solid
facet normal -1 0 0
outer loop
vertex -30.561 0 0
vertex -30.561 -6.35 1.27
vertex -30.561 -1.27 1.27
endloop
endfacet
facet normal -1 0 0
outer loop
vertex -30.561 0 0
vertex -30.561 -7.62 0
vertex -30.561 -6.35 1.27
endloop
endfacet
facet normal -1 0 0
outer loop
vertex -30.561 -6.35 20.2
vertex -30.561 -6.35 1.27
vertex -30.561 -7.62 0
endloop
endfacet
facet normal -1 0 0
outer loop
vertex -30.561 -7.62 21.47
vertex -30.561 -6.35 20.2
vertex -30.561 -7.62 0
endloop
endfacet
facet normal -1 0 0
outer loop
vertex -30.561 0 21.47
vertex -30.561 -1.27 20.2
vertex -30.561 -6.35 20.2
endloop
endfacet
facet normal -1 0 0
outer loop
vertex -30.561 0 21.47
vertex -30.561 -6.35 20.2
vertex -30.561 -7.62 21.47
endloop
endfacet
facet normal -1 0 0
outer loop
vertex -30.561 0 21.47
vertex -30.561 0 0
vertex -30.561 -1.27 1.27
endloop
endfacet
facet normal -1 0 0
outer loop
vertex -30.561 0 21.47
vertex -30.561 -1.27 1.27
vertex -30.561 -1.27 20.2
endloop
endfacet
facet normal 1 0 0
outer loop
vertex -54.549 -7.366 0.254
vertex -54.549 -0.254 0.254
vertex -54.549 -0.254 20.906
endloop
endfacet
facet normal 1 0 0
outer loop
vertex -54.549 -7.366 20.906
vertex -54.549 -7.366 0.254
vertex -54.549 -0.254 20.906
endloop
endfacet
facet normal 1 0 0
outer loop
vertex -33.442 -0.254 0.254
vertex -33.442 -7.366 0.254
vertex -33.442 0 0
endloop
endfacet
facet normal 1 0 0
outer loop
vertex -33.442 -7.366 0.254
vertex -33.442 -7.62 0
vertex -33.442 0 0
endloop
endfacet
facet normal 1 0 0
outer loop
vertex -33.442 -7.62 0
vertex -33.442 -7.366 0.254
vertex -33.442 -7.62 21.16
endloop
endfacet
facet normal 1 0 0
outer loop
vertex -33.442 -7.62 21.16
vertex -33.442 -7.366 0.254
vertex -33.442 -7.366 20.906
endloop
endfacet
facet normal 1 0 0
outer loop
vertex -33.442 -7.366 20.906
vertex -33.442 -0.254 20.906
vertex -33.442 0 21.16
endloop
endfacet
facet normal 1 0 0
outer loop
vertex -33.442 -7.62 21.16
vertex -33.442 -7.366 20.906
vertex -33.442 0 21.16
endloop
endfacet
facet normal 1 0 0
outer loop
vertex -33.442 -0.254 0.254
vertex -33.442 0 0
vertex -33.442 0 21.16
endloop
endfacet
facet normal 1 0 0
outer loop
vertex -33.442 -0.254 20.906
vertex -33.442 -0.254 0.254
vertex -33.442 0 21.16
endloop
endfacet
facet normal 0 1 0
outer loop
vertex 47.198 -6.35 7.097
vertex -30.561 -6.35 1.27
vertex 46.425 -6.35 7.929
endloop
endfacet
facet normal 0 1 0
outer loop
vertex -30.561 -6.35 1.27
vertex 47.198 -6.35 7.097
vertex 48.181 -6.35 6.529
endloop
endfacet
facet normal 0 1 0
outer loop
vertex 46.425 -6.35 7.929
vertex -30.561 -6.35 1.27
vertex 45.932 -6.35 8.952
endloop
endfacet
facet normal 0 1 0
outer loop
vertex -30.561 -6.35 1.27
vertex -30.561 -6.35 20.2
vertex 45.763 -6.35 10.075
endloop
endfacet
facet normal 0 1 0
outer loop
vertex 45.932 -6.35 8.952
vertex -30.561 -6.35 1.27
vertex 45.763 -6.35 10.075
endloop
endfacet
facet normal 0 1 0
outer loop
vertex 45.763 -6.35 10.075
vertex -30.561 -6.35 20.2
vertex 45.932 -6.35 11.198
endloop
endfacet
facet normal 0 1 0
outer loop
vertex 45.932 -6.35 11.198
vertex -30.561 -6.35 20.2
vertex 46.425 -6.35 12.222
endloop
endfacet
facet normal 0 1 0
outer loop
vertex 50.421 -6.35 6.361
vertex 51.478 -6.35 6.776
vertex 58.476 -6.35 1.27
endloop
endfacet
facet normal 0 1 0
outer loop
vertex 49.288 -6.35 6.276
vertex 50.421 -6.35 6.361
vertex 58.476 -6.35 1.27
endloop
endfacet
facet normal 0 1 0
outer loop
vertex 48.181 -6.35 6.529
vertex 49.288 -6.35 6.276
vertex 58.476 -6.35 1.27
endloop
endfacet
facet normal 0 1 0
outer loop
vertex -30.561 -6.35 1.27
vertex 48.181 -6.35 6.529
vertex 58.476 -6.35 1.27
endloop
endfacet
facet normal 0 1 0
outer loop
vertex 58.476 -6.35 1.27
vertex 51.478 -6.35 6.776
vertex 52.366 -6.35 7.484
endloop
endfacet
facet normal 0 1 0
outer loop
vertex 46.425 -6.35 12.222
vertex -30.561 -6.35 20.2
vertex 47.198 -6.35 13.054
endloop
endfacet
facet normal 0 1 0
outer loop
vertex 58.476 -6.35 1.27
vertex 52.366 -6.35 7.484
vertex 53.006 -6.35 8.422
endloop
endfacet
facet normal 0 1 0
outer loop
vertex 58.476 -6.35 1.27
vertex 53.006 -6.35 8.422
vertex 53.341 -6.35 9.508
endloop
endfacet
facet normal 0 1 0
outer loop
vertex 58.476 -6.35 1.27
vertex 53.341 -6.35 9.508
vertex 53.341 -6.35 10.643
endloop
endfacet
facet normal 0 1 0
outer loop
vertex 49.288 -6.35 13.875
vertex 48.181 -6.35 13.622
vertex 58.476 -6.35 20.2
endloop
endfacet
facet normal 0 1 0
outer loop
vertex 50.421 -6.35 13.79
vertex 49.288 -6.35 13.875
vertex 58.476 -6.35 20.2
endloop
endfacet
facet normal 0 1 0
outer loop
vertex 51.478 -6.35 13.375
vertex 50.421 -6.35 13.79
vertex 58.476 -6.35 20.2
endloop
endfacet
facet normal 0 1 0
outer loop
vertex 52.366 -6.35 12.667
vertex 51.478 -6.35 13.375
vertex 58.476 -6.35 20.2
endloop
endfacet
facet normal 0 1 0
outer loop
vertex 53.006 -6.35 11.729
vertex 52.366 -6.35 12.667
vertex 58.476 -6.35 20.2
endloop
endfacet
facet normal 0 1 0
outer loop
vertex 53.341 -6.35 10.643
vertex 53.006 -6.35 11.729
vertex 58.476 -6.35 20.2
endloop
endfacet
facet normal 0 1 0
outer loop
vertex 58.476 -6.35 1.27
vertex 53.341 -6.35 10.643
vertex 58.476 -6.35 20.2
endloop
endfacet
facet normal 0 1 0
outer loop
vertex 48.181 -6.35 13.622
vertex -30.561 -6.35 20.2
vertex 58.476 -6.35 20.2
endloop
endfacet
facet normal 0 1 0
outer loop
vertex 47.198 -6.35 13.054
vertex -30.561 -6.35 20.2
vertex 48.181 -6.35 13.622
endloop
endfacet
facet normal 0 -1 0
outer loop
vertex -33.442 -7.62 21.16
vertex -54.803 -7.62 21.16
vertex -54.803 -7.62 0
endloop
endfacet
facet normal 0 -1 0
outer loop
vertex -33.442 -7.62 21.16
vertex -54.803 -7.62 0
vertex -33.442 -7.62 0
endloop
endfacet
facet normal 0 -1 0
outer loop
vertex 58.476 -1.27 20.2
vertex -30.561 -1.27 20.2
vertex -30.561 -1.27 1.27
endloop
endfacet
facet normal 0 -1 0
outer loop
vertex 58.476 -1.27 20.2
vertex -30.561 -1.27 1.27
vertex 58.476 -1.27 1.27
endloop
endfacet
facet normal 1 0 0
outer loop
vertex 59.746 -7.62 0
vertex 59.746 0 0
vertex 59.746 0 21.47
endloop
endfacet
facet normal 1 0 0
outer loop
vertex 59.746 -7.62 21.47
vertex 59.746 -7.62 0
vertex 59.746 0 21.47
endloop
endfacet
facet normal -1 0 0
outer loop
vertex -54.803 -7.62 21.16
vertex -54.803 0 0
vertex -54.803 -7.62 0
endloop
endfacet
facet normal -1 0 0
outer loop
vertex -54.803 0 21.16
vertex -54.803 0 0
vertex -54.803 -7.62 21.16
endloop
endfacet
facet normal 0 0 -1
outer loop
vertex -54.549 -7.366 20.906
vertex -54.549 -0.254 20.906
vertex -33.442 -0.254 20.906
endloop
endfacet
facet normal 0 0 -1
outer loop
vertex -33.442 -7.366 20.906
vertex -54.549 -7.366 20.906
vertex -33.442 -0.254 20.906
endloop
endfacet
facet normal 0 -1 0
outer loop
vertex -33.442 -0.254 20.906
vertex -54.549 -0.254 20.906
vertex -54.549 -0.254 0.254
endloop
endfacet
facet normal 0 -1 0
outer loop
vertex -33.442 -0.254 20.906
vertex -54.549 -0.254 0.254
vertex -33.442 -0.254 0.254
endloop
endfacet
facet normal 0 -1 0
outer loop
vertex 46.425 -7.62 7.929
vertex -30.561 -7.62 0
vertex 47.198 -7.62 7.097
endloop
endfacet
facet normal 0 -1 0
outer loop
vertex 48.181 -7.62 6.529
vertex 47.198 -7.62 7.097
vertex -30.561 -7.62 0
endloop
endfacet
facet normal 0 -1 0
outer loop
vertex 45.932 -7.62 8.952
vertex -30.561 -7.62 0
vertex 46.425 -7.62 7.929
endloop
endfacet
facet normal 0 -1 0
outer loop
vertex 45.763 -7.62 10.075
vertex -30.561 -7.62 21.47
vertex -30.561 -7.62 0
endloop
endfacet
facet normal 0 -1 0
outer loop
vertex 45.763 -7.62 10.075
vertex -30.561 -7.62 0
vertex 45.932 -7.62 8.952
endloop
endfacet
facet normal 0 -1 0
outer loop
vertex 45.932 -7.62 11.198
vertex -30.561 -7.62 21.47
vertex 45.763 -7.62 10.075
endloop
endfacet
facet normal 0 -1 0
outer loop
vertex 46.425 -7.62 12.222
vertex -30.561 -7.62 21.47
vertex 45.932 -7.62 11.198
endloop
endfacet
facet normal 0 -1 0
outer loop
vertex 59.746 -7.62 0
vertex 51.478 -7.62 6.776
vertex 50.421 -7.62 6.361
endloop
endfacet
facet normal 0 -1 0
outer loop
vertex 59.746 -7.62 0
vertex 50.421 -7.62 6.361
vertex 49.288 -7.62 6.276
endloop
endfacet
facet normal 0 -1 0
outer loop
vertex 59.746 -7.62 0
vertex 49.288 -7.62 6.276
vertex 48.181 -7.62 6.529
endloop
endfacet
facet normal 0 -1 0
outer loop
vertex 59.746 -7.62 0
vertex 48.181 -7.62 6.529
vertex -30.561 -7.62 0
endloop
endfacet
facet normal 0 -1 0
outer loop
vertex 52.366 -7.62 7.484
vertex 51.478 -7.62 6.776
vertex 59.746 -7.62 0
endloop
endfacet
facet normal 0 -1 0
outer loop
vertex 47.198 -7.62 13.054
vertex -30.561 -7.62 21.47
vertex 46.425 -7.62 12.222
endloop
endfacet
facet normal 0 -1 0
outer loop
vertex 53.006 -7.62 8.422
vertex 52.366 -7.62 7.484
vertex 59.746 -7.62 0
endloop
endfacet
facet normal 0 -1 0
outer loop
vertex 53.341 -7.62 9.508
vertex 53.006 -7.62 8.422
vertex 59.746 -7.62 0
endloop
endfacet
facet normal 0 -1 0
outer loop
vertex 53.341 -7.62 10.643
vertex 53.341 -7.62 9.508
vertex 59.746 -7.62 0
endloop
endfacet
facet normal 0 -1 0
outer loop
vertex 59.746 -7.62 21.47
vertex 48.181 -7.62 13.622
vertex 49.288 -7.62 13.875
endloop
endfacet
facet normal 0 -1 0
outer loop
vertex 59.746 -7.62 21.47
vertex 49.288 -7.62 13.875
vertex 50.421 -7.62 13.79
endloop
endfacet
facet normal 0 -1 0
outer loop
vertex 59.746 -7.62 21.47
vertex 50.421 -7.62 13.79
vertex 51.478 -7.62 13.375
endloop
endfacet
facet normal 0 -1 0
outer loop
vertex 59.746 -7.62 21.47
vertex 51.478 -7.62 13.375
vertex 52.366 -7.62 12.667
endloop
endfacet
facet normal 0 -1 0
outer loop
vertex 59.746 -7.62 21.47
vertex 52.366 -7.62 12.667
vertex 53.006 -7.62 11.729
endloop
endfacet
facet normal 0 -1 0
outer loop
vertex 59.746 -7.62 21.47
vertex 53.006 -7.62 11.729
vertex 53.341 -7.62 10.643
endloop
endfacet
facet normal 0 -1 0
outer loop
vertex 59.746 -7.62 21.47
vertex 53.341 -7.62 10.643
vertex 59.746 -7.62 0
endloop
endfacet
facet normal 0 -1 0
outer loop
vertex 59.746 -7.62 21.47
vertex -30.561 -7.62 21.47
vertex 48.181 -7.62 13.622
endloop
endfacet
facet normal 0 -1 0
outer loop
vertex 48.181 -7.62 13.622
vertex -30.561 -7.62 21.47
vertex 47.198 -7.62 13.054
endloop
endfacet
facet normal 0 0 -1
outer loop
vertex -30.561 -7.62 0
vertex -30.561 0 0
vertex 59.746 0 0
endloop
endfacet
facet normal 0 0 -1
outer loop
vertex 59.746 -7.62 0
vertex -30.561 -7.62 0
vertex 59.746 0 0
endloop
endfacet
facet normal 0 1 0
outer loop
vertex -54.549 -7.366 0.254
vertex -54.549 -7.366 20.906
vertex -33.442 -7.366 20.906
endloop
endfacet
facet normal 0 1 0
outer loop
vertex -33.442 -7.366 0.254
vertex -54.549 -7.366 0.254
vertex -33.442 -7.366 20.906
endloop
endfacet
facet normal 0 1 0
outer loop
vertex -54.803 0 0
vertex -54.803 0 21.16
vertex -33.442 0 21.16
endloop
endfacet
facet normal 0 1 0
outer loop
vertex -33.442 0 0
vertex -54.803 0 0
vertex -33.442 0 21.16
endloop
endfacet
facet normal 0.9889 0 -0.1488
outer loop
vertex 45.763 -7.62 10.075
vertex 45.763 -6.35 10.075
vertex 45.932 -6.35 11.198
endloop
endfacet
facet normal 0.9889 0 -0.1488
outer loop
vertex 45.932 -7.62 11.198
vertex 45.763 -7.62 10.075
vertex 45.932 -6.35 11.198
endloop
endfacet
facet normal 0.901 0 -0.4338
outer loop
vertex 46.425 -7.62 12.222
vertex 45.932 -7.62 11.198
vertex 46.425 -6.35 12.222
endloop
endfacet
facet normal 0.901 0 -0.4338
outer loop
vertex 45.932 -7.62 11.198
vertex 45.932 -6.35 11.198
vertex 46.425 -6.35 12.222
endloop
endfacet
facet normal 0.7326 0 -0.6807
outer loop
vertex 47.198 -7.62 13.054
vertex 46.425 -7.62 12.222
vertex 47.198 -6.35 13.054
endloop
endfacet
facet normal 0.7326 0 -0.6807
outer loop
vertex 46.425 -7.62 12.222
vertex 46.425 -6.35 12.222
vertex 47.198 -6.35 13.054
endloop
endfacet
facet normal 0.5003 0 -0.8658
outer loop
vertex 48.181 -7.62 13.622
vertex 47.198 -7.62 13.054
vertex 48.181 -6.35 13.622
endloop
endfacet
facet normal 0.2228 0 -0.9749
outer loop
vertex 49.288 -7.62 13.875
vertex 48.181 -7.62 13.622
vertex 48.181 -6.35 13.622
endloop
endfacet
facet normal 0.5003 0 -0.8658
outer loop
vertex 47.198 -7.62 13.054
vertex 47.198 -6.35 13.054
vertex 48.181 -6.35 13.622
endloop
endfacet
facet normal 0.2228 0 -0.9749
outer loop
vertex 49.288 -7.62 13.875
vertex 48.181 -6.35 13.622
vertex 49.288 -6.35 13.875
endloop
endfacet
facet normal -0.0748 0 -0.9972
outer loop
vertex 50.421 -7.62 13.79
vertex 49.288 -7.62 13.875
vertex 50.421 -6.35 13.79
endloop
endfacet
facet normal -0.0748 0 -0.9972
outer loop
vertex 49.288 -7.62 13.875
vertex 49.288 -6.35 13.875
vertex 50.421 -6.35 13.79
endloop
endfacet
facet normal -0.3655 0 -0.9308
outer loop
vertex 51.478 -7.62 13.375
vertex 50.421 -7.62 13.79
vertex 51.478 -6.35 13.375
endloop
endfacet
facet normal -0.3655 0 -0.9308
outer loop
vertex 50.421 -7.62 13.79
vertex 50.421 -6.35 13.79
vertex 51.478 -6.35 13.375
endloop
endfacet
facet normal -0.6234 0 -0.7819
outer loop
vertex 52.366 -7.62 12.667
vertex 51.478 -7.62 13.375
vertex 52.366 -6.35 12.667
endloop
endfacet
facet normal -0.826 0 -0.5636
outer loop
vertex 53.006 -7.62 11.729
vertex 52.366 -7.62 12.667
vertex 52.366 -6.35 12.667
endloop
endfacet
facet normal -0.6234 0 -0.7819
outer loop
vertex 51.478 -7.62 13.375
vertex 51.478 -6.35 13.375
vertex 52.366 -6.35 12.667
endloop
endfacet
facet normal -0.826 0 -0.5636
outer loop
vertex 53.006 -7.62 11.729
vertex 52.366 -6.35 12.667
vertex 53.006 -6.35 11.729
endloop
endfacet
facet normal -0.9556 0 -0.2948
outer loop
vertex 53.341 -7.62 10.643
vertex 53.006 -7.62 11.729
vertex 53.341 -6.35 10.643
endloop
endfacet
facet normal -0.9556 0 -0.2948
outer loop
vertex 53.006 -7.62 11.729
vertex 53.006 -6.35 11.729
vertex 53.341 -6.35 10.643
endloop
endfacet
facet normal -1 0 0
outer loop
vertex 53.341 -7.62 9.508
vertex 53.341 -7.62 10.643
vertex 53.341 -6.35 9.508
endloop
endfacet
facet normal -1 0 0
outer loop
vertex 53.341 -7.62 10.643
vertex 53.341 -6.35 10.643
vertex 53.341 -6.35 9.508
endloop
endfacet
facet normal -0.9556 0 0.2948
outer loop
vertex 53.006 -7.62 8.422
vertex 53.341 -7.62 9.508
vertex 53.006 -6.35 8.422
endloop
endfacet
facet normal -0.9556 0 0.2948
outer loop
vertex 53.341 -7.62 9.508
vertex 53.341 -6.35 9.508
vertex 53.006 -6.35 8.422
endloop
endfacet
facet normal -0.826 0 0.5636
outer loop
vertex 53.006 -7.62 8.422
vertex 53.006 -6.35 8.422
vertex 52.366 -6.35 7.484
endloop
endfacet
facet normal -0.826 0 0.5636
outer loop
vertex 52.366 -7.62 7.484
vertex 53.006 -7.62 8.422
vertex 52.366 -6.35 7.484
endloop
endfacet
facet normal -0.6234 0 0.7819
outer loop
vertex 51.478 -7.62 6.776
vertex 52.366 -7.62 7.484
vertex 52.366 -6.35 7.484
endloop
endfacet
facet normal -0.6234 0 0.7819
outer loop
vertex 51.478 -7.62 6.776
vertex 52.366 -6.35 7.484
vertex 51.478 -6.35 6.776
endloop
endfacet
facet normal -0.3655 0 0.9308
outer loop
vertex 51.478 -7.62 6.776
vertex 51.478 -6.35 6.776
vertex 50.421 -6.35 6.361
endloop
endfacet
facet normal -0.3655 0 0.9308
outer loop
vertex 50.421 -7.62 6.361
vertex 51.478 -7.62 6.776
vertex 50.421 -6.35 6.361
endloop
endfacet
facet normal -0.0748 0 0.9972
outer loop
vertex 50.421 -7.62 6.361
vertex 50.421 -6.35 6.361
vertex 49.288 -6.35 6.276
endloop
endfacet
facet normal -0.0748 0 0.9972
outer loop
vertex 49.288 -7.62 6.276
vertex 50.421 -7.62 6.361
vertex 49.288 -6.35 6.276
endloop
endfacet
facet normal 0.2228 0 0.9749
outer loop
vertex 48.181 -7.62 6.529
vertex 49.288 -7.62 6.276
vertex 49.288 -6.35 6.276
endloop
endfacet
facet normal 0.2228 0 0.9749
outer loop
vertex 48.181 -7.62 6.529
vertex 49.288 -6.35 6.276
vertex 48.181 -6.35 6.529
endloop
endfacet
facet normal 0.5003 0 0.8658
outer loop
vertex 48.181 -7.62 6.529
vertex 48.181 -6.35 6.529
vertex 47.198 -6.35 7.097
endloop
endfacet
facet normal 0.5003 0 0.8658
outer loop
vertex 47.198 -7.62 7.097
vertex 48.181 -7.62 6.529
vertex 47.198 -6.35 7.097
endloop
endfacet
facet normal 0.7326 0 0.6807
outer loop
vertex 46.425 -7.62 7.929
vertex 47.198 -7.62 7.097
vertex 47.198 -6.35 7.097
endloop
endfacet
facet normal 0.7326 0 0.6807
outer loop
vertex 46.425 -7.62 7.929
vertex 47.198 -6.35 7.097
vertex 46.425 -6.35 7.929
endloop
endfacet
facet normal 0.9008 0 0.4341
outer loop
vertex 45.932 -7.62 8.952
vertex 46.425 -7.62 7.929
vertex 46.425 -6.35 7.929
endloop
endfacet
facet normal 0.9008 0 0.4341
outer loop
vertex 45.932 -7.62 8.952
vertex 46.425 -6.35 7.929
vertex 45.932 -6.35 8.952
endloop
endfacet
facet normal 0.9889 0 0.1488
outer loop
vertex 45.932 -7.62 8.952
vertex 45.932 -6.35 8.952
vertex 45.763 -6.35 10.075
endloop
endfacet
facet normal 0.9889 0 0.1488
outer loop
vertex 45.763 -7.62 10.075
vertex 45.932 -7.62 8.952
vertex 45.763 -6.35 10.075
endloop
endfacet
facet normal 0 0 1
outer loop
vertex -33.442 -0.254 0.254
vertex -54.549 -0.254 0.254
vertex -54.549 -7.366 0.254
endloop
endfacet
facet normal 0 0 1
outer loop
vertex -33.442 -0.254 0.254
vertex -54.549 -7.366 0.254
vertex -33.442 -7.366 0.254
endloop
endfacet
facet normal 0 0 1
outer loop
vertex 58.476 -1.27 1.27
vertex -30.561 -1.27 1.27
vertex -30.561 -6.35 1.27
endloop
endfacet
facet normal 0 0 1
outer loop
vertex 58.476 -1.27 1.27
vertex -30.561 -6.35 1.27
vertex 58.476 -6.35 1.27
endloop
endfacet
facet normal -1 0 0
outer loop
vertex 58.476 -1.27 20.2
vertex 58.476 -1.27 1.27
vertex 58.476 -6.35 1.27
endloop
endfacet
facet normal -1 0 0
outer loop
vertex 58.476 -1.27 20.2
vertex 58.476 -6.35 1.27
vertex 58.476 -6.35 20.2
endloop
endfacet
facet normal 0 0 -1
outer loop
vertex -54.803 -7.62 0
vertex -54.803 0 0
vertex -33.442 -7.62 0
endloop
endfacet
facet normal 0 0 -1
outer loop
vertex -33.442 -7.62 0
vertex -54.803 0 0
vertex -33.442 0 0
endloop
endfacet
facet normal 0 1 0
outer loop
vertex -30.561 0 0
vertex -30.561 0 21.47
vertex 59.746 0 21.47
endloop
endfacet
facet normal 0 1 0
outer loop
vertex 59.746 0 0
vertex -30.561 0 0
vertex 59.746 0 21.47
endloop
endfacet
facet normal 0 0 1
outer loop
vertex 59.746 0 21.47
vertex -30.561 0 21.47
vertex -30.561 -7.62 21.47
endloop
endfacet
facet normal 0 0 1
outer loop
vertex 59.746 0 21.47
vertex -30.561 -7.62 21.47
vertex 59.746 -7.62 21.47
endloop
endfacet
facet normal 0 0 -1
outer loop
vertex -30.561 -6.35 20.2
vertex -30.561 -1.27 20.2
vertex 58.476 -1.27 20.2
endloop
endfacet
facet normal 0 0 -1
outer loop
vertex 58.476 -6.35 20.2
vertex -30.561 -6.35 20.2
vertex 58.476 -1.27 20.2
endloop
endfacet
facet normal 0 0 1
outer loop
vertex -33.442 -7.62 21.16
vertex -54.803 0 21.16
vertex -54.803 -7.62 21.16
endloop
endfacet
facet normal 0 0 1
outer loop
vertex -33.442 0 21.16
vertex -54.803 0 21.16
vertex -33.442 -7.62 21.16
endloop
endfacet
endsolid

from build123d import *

# Parameters (mm, degrees)
F0_W     = 90.306844
F0_H     = 21.470224
F1_DEPTH = 7.62
F2_T     = -1.27
F5_D     = 7.62
F5_DEPTH = 2.54
F6_W     = 21.361325
F6_H     = 21.159645
F7_DEPTH = 7.62
F8_T     = -0.254


with BuildPart() as f1:
    # F0 (on Front) → F1 (new body)
    with BuildSketch(Plane.XZ):
        with Locations((14.59234, 10.735112)):
            Rectangle(F0_W, F0_H)
    extrude(amount=F1_DEPTH)

    # F2
    f2_openings = [f1.faces().sort_by_distance(p)[0] for p in [
        (-30.561082, -3.81, 10.735112),
    ]]
    offset(amount=F2_T, openings=f2_openings)

    # F5
    with Locations(Plane.XZ.offset(7.62)):
        with Locations((49.573194, 10.075469)):
            Hole(F5_D / 2, depth=F5_DEPTH)


with BuildPart() as f7:
    # F6 (on Front) → F7 (new body)
    with BuildSketch(Plane.XZ):
        with Locations((-44.122433, 10.579822)):
            Rectangle(F6_W, F6_H)
    extrude(amount=F7_DEPTH)

    # F8
    f8_openings = [f7.faces().sort_by_distance(p)[0] for p in [
        (-33.441771, -3.81, 10.579823),
    ]]
    offset(amount=F8_T, openings=f8_openings)


solid = Compound([f1.part, f7.part])
